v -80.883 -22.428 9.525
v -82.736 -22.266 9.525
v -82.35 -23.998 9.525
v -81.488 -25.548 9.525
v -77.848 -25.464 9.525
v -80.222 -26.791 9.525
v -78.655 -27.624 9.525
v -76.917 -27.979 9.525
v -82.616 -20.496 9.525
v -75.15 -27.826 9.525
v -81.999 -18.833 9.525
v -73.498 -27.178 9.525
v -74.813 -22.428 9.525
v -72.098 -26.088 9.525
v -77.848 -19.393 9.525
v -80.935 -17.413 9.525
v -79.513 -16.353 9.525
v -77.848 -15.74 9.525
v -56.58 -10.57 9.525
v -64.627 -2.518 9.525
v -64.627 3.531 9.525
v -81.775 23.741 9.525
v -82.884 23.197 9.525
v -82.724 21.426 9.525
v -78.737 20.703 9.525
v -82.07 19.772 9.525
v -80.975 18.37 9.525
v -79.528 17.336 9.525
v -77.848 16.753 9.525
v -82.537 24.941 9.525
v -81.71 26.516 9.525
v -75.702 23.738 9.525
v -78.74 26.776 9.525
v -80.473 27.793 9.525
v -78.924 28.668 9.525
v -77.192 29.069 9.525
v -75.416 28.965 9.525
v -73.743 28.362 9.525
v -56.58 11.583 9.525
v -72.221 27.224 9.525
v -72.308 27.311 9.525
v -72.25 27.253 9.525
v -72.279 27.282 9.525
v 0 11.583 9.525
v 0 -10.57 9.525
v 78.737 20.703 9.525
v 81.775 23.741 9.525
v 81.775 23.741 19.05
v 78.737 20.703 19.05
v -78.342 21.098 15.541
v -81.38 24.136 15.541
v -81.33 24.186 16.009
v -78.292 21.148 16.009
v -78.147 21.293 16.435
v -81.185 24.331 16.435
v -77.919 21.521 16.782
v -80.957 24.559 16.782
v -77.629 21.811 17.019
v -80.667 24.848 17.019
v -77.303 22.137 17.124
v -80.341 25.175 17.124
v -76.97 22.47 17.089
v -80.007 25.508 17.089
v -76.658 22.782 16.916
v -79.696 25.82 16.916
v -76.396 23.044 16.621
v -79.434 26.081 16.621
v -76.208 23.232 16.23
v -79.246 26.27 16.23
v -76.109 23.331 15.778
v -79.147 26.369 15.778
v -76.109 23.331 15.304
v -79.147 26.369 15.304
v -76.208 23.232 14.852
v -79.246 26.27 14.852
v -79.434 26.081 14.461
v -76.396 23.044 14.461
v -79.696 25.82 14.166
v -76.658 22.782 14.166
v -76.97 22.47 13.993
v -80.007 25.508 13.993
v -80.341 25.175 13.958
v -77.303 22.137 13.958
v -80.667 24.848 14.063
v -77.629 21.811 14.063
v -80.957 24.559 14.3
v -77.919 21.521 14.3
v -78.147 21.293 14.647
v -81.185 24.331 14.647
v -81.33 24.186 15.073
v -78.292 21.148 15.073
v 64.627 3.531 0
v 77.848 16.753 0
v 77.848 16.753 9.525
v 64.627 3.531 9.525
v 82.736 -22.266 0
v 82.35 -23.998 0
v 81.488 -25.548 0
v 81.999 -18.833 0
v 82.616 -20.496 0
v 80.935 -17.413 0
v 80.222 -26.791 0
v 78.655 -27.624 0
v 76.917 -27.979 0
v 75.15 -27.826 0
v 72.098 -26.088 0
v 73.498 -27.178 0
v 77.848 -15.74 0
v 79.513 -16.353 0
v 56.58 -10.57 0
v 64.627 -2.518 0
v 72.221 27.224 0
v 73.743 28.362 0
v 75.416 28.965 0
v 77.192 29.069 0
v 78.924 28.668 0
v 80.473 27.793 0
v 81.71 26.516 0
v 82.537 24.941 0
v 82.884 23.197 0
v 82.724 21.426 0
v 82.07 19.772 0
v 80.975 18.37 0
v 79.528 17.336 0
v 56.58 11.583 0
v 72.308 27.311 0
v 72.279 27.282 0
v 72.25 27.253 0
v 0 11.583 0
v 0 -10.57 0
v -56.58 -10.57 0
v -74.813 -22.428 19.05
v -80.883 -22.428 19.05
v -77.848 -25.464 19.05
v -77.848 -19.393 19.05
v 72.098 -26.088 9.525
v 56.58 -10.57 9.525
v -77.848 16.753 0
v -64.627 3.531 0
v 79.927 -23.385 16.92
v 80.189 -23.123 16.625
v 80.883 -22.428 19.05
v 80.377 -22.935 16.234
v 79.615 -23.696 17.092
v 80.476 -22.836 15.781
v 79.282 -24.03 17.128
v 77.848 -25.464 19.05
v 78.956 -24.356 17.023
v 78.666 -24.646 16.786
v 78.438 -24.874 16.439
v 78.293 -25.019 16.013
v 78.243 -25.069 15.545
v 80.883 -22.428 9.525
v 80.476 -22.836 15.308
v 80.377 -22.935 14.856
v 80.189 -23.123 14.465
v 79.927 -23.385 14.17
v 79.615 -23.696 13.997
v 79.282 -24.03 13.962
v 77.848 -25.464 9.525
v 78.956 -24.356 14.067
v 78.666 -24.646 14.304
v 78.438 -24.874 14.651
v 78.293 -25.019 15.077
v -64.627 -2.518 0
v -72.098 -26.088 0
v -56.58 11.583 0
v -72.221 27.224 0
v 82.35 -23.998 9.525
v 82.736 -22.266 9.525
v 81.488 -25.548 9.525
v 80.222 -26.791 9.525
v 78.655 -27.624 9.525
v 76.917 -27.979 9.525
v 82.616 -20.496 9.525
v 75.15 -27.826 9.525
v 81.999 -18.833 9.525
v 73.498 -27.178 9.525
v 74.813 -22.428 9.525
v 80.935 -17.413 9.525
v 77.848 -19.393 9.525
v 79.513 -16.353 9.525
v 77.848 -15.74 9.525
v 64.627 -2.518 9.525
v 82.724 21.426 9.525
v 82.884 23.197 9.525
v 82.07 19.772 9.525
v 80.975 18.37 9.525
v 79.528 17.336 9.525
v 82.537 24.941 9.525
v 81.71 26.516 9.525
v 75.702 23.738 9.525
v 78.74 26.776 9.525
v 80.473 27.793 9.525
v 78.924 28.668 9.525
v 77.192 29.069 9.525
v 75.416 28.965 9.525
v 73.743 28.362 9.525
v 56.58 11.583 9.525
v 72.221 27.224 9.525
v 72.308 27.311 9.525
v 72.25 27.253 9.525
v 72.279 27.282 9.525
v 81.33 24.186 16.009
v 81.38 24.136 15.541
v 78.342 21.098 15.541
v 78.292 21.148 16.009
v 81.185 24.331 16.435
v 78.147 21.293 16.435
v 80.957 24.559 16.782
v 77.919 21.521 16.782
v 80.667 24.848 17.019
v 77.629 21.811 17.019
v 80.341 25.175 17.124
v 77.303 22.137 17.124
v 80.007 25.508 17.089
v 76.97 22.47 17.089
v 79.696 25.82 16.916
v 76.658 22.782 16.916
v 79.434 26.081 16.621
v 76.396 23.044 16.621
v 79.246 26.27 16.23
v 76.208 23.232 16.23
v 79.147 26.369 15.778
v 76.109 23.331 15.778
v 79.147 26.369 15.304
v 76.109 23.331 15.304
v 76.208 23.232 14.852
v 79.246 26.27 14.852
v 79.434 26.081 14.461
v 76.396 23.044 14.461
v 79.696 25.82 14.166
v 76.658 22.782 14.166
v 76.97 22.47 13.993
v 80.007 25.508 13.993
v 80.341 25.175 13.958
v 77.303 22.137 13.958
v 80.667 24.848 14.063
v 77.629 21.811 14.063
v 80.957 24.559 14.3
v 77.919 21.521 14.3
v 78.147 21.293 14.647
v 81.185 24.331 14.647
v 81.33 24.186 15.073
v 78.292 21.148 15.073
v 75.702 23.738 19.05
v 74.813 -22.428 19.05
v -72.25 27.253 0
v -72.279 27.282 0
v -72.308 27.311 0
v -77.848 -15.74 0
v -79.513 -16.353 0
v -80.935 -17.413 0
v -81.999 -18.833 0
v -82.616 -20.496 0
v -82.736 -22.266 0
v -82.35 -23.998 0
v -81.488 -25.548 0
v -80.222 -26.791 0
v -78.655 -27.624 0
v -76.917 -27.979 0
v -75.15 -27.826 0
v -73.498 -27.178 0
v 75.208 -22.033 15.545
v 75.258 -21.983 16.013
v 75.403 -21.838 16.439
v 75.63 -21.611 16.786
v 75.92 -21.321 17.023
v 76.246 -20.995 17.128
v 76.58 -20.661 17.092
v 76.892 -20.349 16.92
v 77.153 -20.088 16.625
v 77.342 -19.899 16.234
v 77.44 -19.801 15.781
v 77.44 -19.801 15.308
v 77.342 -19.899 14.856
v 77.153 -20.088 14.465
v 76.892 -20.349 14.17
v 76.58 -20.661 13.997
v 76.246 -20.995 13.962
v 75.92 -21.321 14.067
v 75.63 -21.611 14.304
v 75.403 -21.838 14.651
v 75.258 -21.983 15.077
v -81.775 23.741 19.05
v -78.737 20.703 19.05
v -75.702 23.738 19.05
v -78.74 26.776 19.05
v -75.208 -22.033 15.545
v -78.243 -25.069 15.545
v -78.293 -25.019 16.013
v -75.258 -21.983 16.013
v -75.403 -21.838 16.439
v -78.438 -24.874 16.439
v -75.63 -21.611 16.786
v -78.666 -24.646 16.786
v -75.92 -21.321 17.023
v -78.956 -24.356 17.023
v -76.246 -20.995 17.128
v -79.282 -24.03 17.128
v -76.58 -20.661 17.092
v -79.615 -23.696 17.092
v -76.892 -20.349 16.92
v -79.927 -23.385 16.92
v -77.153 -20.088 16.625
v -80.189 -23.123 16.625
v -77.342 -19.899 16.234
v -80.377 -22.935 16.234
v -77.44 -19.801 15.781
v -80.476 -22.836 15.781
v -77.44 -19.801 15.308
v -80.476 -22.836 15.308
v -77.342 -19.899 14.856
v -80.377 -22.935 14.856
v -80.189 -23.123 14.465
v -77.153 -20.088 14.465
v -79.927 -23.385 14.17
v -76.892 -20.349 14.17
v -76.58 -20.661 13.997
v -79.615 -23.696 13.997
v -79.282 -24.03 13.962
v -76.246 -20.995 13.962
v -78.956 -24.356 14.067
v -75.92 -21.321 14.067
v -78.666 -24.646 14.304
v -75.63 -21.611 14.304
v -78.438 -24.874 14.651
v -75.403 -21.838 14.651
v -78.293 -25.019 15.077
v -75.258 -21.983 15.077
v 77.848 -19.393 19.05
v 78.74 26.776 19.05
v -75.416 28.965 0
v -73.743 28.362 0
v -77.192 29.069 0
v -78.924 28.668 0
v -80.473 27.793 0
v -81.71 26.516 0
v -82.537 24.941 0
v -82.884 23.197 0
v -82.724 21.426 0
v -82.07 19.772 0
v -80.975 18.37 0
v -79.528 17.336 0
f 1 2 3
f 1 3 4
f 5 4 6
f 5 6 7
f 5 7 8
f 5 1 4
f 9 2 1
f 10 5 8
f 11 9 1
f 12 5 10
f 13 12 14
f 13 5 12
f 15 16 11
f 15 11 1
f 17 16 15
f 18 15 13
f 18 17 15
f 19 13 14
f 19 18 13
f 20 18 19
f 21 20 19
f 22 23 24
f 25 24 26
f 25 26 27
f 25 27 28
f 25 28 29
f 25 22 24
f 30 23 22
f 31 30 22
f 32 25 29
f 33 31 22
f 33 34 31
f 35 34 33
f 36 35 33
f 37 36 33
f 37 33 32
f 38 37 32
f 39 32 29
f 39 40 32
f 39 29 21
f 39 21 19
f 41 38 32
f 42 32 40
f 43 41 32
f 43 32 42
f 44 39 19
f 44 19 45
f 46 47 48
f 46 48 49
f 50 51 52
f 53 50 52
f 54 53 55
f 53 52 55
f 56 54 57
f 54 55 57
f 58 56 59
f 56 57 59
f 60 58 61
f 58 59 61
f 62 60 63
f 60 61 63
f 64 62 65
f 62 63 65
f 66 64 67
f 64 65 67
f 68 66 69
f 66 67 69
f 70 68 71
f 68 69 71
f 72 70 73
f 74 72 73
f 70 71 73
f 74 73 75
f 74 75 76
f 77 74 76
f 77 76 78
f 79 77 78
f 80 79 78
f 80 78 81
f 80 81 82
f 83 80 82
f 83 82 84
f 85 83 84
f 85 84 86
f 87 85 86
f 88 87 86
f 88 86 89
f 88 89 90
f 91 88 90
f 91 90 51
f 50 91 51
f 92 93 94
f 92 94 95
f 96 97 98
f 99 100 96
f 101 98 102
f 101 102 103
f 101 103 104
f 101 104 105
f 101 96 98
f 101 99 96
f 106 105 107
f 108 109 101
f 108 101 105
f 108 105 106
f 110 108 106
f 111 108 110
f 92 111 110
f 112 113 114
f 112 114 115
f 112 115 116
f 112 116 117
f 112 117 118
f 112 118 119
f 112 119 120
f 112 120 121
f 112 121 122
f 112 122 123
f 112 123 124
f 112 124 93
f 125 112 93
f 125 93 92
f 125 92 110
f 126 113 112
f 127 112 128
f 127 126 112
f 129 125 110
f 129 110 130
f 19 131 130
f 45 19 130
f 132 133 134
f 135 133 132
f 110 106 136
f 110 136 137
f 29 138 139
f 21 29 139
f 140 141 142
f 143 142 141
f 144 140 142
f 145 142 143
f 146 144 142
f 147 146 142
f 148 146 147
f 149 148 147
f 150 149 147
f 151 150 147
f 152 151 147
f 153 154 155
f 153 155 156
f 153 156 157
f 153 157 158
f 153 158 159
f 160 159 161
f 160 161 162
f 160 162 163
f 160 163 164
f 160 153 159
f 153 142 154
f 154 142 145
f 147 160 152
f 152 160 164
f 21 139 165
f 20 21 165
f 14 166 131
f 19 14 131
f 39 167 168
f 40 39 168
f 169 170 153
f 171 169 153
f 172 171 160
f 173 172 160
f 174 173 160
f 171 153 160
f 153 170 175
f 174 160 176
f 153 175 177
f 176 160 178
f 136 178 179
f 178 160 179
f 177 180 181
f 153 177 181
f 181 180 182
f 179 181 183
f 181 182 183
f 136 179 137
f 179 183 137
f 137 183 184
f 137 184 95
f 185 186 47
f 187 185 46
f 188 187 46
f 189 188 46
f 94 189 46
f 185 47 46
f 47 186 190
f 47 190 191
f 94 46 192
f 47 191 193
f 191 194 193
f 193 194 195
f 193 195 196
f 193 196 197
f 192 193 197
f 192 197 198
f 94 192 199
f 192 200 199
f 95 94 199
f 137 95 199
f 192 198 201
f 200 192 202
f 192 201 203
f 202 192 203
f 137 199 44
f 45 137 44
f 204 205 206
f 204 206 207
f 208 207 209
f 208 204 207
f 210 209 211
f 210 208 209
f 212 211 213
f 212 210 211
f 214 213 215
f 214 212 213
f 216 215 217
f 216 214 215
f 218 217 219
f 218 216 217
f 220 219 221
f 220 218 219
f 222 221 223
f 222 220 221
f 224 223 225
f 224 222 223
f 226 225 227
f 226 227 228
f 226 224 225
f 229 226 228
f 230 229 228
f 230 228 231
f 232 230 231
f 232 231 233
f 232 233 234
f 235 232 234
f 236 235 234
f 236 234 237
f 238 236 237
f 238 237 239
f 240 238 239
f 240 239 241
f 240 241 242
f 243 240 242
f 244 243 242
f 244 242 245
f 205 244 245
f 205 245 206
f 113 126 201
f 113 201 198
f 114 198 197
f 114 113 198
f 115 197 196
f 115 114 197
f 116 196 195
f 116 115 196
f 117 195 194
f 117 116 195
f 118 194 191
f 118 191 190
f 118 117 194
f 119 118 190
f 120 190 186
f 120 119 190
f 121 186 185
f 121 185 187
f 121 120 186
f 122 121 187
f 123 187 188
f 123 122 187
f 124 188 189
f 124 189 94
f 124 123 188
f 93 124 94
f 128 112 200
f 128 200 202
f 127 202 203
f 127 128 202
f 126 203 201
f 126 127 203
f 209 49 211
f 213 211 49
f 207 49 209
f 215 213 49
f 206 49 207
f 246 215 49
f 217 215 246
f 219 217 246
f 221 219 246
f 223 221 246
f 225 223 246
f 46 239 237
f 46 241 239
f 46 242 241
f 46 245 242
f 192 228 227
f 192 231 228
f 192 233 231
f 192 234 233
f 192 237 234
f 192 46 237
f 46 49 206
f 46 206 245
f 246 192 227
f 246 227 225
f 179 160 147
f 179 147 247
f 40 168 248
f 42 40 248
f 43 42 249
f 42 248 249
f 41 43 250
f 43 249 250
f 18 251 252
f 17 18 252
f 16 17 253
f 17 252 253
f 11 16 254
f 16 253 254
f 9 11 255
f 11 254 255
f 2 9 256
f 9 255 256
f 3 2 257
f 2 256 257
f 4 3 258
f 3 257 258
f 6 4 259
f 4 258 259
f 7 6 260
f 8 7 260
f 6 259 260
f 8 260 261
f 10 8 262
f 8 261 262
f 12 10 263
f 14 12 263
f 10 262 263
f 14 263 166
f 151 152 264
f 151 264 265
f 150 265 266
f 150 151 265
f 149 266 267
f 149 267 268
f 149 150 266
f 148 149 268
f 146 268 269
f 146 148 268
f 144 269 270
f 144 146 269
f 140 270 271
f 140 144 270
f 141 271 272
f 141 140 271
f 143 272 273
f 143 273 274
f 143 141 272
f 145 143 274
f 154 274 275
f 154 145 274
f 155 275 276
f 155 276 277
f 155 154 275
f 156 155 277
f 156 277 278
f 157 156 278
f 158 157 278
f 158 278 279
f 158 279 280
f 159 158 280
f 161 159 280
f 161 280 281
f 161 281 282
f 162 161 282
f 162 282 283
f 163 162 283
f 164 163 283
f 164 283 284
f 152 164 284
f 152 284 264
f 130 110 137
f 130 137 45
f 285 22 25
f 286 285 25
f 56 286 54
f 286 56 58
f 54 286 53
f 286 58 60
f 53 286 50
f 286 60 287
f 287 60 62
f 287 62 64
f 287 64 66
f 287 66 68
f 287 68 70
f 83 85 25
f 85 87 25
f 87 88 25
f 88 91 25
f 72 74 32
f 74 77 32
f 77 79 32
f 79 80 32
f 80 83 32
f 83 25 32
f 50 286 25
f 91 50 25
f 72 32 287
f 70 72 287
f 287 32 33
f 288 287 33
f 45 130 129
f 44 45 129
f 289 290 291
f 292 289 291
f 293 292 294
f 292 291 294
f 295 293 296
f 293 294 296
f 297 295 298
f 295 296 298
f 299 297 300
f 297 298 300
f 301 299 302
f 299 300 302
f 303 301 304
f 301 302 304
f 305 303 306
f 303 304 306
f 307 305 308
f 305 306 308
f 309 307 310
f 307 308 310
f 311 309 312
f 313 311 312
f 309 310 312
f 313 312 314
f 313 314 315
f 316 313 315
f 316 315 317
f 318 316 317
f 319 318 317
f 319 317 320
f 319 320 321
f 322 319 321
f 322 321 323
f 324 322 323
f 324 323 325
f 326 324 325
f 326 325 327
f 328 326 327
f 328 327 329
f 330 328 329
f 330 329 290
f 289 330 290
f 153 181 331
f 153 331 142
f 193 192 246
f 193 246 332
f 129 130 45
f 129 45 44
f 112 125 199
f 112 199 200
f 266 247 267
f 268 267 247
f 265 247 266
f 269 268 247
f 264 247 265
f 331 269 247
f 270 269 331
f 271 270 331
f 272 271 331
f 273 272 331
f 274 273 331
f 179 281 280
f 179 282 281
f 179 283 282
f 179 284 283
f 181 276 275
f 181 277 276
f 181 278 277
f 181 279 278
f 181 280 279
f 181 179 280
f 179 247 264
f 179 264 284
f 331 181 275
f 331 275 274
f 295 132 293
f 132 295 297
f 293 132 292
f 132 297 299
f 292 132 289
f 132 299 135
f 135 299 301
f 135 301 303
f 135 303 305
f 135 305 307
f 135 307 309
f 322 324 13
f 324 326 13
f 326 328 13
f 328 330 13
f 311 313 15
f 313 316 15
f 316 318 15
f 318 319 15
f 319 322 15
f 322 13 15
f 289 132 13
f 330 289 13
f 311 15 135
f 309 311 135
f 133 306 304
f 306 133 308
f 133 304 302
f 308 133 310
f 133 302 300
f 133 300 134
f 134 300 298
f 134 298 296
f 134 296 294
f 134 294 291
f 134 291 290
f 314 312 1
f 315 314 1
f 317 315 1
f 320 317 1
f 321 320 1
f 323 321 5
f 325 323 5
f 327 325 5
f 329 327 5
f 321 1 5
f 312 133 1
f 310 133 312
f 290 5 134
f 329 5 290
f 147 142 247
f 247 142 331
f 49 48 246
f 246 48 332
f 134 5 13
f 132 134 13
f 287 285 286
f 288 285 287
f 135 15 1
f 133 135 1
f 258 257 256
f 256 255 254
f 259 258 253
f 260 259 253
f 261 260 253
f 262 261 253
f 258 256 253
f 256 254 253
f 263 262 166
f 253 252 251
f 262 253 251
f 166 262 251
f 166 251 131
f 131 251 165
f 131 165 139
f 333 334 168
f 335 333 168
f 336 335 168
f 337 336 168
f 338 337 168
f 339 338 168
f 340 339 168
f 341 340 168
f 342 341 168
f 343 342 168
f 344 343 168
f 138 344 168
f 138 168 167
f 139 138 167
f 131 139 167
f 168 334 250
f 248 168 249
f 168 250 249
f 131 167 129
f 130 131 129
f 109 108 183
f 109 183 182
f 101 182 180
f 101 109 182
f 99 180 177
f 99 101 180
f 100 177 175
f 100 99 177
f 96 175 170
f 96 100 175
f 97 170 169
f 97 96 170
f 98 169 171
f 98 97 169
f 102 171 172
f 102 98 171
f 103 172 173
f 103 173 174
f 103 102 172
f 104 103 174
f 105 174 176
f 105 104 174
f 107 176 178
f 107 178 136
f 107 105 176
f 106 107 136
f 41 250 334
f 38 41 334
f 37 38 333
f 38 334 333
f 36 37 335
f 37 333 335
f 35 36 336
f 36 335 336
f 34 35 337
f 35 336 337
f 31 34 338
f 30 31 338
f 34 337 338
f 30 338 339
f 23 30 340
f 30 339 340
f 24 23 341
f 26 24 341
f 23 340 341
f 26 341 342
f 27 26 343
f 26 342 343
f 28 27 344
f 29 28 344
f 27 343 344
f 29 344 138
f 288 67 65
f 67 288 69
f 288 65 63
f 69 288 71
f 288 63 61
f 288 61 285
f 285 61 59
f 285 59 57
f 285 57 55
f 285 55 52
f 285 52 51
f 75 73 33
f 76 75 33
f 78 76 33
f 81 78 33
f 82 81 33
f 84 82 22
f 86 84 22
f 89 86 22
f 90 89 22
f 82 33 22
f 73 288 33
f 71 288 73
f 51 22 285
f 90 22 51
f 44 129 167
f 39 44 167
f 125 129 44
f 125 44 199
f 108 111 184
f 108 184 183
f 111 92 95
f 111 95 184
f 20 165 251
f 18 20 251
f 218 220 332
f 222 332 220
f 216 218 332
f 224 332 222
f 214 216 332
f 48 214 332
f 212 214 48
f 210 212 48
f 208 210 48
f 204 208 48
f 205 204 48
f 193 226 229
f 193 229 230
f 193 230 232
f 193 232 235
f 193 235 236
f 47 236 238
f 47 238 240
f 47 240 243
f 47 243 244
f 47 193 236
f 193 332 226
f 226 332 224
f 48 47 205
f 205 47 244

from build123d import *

# Parameters (mm, degrees)
F1_DEPTH = 9.525
F3_DEPTH = 9.525
F6_D     = 3.175
F7_D     = 3.175


with BuildPart() as f1:
    # F0 (on Top) → F1 (new body)
    with BuildSketch(Plane.XY):
        Polygon((-56.580171, -10.570083), (0, -10.570083), (0, 11.583108), (-56.580171, 11.583108), (-64.626686, 11.583108), (-64.626686, 3.531308), (-64.626686, -2.518283), (-64.626686, -10.570083), align=None)
        with BuildLine():
            Line((-72.098054, -26.087966), (-56.580171, -10.570083))
            Line((-56.580171, -10.570083), (-64.626686, -10.570083))
            Line((-64.626686, -10.570083), (-64.626686, -2.518283))
            Line((-64.626686, -2.518283), (-77.847999, -15.739596))
            ThreePointArc((-77.847999, -15.739596), (-72.664613, -16.984937), (-70.369875, -21.796647))
            ThreePointArc((-70.369875, -21.796647), (-70.818146, -24.109763), (-72.098054, -26.087966))
        make_face()
        with BuildLine():
            ThreePointArc((-77.847999, -15.739596), (-81.974608, -24.804125), (-72.098054, -26.087966))
            ThreePointArc((-72.098054, -26.087966), (-70.818146, -24.109763), (-70.369875, -21.796647))
            ThreePointArc((-70.369875, -21.796647), (-72.664613, -16.984937), (-77.847999, -15.739596))
        make_face()
        with BuildLine():
            Line((-64.626686, 11.583108), (-56.580171, 11.583108))
            Line((-56.580171, 11.583108), (-72.221464, 27.224401))
            ThreePointArc((-72.221464, 27.224401), (-70.903293, 25.219759), (-70.441021, 22.865515))
            ThreePointArc((-70.441021, 22.865515), (-72.704054, 18.063672), (-77.847999, 16.752621))
            Line((-77.847999, 16.752621), (-64.626686, 3.531308))
            Line((-64.626686, 3.531308), (-64.626686, 11.583108))
        make_face()
        with BuildLine():
            ThreePointArc((-70.441021, 22.865515), (-70.903293, 25.219759), (-72.221464, 27.224401))
            Line((-72.221464, 27.224401), (-72.308075, 27.311012))
            ThreePointArc((-72.308075, 27.311012), (-82.180089, 25.75822), (-77.847999, 16.752621))
            ThreePointArc((-77.847999, 16.752621), (-72.704054, 18.063672), (-70.441021, 22.865515))
        make_face()
        with BuildLine():
            Line((-72.308075, 27.311012), (-72.221464, 27.224401))
            ThreePointArc((-72.221464, 27.224401), (-72.264556, 27.267919), (-72.308075, 27.311012))
        make_face()
    extrude(amount=F1_DEPTH)

    # F2 (on face) → F3 (join)
    with BuildSketch(Plane.XY.offset(9.525)):
        Polygon((-81.774934, 23.740937), (-78.737025, 20.703029), (-75.701699, 23.738355), (-78.739607, 26.776264), align=None)
        Polygon((-77.847999, -25.463689), (-74.812672, -22.428363), (-77.847999, -19.393036), (-80.883325, -22.428363), align=None)
    extrude(amount=F3_DEPTH)

    # F6 (through all)
    with Locations(Plane(origin=(-48.620517, -48.620517, 0), x_dir=(-0.707107, 0.707107, 0), z_dir=(0.707107, 0.707107, 0))):
        with Locations((39.187601, 15.5448)):
            Hole(F6_D / 2)

    # F7 (through all)
    with Locations(Plane(origin=(-49.720027, 49.720027, 0), x_dir=(0.707107, 0.707107, 0), z_dir=(0.707107, -0.707107, 0))):
        with Locations((-38.889933, 15.540928)):
            Hole(F7_D / 2)


with BuildPart() as f8_1:
    # F8: instance of F1
    add(f1.part.mirror(Plane(origin=(0, 0.506512, 4.7625), x_dir=(0, 1, 0), z_dir=(1, 0, 0))))


solid = Compound([f1.part, f8_1.part])
